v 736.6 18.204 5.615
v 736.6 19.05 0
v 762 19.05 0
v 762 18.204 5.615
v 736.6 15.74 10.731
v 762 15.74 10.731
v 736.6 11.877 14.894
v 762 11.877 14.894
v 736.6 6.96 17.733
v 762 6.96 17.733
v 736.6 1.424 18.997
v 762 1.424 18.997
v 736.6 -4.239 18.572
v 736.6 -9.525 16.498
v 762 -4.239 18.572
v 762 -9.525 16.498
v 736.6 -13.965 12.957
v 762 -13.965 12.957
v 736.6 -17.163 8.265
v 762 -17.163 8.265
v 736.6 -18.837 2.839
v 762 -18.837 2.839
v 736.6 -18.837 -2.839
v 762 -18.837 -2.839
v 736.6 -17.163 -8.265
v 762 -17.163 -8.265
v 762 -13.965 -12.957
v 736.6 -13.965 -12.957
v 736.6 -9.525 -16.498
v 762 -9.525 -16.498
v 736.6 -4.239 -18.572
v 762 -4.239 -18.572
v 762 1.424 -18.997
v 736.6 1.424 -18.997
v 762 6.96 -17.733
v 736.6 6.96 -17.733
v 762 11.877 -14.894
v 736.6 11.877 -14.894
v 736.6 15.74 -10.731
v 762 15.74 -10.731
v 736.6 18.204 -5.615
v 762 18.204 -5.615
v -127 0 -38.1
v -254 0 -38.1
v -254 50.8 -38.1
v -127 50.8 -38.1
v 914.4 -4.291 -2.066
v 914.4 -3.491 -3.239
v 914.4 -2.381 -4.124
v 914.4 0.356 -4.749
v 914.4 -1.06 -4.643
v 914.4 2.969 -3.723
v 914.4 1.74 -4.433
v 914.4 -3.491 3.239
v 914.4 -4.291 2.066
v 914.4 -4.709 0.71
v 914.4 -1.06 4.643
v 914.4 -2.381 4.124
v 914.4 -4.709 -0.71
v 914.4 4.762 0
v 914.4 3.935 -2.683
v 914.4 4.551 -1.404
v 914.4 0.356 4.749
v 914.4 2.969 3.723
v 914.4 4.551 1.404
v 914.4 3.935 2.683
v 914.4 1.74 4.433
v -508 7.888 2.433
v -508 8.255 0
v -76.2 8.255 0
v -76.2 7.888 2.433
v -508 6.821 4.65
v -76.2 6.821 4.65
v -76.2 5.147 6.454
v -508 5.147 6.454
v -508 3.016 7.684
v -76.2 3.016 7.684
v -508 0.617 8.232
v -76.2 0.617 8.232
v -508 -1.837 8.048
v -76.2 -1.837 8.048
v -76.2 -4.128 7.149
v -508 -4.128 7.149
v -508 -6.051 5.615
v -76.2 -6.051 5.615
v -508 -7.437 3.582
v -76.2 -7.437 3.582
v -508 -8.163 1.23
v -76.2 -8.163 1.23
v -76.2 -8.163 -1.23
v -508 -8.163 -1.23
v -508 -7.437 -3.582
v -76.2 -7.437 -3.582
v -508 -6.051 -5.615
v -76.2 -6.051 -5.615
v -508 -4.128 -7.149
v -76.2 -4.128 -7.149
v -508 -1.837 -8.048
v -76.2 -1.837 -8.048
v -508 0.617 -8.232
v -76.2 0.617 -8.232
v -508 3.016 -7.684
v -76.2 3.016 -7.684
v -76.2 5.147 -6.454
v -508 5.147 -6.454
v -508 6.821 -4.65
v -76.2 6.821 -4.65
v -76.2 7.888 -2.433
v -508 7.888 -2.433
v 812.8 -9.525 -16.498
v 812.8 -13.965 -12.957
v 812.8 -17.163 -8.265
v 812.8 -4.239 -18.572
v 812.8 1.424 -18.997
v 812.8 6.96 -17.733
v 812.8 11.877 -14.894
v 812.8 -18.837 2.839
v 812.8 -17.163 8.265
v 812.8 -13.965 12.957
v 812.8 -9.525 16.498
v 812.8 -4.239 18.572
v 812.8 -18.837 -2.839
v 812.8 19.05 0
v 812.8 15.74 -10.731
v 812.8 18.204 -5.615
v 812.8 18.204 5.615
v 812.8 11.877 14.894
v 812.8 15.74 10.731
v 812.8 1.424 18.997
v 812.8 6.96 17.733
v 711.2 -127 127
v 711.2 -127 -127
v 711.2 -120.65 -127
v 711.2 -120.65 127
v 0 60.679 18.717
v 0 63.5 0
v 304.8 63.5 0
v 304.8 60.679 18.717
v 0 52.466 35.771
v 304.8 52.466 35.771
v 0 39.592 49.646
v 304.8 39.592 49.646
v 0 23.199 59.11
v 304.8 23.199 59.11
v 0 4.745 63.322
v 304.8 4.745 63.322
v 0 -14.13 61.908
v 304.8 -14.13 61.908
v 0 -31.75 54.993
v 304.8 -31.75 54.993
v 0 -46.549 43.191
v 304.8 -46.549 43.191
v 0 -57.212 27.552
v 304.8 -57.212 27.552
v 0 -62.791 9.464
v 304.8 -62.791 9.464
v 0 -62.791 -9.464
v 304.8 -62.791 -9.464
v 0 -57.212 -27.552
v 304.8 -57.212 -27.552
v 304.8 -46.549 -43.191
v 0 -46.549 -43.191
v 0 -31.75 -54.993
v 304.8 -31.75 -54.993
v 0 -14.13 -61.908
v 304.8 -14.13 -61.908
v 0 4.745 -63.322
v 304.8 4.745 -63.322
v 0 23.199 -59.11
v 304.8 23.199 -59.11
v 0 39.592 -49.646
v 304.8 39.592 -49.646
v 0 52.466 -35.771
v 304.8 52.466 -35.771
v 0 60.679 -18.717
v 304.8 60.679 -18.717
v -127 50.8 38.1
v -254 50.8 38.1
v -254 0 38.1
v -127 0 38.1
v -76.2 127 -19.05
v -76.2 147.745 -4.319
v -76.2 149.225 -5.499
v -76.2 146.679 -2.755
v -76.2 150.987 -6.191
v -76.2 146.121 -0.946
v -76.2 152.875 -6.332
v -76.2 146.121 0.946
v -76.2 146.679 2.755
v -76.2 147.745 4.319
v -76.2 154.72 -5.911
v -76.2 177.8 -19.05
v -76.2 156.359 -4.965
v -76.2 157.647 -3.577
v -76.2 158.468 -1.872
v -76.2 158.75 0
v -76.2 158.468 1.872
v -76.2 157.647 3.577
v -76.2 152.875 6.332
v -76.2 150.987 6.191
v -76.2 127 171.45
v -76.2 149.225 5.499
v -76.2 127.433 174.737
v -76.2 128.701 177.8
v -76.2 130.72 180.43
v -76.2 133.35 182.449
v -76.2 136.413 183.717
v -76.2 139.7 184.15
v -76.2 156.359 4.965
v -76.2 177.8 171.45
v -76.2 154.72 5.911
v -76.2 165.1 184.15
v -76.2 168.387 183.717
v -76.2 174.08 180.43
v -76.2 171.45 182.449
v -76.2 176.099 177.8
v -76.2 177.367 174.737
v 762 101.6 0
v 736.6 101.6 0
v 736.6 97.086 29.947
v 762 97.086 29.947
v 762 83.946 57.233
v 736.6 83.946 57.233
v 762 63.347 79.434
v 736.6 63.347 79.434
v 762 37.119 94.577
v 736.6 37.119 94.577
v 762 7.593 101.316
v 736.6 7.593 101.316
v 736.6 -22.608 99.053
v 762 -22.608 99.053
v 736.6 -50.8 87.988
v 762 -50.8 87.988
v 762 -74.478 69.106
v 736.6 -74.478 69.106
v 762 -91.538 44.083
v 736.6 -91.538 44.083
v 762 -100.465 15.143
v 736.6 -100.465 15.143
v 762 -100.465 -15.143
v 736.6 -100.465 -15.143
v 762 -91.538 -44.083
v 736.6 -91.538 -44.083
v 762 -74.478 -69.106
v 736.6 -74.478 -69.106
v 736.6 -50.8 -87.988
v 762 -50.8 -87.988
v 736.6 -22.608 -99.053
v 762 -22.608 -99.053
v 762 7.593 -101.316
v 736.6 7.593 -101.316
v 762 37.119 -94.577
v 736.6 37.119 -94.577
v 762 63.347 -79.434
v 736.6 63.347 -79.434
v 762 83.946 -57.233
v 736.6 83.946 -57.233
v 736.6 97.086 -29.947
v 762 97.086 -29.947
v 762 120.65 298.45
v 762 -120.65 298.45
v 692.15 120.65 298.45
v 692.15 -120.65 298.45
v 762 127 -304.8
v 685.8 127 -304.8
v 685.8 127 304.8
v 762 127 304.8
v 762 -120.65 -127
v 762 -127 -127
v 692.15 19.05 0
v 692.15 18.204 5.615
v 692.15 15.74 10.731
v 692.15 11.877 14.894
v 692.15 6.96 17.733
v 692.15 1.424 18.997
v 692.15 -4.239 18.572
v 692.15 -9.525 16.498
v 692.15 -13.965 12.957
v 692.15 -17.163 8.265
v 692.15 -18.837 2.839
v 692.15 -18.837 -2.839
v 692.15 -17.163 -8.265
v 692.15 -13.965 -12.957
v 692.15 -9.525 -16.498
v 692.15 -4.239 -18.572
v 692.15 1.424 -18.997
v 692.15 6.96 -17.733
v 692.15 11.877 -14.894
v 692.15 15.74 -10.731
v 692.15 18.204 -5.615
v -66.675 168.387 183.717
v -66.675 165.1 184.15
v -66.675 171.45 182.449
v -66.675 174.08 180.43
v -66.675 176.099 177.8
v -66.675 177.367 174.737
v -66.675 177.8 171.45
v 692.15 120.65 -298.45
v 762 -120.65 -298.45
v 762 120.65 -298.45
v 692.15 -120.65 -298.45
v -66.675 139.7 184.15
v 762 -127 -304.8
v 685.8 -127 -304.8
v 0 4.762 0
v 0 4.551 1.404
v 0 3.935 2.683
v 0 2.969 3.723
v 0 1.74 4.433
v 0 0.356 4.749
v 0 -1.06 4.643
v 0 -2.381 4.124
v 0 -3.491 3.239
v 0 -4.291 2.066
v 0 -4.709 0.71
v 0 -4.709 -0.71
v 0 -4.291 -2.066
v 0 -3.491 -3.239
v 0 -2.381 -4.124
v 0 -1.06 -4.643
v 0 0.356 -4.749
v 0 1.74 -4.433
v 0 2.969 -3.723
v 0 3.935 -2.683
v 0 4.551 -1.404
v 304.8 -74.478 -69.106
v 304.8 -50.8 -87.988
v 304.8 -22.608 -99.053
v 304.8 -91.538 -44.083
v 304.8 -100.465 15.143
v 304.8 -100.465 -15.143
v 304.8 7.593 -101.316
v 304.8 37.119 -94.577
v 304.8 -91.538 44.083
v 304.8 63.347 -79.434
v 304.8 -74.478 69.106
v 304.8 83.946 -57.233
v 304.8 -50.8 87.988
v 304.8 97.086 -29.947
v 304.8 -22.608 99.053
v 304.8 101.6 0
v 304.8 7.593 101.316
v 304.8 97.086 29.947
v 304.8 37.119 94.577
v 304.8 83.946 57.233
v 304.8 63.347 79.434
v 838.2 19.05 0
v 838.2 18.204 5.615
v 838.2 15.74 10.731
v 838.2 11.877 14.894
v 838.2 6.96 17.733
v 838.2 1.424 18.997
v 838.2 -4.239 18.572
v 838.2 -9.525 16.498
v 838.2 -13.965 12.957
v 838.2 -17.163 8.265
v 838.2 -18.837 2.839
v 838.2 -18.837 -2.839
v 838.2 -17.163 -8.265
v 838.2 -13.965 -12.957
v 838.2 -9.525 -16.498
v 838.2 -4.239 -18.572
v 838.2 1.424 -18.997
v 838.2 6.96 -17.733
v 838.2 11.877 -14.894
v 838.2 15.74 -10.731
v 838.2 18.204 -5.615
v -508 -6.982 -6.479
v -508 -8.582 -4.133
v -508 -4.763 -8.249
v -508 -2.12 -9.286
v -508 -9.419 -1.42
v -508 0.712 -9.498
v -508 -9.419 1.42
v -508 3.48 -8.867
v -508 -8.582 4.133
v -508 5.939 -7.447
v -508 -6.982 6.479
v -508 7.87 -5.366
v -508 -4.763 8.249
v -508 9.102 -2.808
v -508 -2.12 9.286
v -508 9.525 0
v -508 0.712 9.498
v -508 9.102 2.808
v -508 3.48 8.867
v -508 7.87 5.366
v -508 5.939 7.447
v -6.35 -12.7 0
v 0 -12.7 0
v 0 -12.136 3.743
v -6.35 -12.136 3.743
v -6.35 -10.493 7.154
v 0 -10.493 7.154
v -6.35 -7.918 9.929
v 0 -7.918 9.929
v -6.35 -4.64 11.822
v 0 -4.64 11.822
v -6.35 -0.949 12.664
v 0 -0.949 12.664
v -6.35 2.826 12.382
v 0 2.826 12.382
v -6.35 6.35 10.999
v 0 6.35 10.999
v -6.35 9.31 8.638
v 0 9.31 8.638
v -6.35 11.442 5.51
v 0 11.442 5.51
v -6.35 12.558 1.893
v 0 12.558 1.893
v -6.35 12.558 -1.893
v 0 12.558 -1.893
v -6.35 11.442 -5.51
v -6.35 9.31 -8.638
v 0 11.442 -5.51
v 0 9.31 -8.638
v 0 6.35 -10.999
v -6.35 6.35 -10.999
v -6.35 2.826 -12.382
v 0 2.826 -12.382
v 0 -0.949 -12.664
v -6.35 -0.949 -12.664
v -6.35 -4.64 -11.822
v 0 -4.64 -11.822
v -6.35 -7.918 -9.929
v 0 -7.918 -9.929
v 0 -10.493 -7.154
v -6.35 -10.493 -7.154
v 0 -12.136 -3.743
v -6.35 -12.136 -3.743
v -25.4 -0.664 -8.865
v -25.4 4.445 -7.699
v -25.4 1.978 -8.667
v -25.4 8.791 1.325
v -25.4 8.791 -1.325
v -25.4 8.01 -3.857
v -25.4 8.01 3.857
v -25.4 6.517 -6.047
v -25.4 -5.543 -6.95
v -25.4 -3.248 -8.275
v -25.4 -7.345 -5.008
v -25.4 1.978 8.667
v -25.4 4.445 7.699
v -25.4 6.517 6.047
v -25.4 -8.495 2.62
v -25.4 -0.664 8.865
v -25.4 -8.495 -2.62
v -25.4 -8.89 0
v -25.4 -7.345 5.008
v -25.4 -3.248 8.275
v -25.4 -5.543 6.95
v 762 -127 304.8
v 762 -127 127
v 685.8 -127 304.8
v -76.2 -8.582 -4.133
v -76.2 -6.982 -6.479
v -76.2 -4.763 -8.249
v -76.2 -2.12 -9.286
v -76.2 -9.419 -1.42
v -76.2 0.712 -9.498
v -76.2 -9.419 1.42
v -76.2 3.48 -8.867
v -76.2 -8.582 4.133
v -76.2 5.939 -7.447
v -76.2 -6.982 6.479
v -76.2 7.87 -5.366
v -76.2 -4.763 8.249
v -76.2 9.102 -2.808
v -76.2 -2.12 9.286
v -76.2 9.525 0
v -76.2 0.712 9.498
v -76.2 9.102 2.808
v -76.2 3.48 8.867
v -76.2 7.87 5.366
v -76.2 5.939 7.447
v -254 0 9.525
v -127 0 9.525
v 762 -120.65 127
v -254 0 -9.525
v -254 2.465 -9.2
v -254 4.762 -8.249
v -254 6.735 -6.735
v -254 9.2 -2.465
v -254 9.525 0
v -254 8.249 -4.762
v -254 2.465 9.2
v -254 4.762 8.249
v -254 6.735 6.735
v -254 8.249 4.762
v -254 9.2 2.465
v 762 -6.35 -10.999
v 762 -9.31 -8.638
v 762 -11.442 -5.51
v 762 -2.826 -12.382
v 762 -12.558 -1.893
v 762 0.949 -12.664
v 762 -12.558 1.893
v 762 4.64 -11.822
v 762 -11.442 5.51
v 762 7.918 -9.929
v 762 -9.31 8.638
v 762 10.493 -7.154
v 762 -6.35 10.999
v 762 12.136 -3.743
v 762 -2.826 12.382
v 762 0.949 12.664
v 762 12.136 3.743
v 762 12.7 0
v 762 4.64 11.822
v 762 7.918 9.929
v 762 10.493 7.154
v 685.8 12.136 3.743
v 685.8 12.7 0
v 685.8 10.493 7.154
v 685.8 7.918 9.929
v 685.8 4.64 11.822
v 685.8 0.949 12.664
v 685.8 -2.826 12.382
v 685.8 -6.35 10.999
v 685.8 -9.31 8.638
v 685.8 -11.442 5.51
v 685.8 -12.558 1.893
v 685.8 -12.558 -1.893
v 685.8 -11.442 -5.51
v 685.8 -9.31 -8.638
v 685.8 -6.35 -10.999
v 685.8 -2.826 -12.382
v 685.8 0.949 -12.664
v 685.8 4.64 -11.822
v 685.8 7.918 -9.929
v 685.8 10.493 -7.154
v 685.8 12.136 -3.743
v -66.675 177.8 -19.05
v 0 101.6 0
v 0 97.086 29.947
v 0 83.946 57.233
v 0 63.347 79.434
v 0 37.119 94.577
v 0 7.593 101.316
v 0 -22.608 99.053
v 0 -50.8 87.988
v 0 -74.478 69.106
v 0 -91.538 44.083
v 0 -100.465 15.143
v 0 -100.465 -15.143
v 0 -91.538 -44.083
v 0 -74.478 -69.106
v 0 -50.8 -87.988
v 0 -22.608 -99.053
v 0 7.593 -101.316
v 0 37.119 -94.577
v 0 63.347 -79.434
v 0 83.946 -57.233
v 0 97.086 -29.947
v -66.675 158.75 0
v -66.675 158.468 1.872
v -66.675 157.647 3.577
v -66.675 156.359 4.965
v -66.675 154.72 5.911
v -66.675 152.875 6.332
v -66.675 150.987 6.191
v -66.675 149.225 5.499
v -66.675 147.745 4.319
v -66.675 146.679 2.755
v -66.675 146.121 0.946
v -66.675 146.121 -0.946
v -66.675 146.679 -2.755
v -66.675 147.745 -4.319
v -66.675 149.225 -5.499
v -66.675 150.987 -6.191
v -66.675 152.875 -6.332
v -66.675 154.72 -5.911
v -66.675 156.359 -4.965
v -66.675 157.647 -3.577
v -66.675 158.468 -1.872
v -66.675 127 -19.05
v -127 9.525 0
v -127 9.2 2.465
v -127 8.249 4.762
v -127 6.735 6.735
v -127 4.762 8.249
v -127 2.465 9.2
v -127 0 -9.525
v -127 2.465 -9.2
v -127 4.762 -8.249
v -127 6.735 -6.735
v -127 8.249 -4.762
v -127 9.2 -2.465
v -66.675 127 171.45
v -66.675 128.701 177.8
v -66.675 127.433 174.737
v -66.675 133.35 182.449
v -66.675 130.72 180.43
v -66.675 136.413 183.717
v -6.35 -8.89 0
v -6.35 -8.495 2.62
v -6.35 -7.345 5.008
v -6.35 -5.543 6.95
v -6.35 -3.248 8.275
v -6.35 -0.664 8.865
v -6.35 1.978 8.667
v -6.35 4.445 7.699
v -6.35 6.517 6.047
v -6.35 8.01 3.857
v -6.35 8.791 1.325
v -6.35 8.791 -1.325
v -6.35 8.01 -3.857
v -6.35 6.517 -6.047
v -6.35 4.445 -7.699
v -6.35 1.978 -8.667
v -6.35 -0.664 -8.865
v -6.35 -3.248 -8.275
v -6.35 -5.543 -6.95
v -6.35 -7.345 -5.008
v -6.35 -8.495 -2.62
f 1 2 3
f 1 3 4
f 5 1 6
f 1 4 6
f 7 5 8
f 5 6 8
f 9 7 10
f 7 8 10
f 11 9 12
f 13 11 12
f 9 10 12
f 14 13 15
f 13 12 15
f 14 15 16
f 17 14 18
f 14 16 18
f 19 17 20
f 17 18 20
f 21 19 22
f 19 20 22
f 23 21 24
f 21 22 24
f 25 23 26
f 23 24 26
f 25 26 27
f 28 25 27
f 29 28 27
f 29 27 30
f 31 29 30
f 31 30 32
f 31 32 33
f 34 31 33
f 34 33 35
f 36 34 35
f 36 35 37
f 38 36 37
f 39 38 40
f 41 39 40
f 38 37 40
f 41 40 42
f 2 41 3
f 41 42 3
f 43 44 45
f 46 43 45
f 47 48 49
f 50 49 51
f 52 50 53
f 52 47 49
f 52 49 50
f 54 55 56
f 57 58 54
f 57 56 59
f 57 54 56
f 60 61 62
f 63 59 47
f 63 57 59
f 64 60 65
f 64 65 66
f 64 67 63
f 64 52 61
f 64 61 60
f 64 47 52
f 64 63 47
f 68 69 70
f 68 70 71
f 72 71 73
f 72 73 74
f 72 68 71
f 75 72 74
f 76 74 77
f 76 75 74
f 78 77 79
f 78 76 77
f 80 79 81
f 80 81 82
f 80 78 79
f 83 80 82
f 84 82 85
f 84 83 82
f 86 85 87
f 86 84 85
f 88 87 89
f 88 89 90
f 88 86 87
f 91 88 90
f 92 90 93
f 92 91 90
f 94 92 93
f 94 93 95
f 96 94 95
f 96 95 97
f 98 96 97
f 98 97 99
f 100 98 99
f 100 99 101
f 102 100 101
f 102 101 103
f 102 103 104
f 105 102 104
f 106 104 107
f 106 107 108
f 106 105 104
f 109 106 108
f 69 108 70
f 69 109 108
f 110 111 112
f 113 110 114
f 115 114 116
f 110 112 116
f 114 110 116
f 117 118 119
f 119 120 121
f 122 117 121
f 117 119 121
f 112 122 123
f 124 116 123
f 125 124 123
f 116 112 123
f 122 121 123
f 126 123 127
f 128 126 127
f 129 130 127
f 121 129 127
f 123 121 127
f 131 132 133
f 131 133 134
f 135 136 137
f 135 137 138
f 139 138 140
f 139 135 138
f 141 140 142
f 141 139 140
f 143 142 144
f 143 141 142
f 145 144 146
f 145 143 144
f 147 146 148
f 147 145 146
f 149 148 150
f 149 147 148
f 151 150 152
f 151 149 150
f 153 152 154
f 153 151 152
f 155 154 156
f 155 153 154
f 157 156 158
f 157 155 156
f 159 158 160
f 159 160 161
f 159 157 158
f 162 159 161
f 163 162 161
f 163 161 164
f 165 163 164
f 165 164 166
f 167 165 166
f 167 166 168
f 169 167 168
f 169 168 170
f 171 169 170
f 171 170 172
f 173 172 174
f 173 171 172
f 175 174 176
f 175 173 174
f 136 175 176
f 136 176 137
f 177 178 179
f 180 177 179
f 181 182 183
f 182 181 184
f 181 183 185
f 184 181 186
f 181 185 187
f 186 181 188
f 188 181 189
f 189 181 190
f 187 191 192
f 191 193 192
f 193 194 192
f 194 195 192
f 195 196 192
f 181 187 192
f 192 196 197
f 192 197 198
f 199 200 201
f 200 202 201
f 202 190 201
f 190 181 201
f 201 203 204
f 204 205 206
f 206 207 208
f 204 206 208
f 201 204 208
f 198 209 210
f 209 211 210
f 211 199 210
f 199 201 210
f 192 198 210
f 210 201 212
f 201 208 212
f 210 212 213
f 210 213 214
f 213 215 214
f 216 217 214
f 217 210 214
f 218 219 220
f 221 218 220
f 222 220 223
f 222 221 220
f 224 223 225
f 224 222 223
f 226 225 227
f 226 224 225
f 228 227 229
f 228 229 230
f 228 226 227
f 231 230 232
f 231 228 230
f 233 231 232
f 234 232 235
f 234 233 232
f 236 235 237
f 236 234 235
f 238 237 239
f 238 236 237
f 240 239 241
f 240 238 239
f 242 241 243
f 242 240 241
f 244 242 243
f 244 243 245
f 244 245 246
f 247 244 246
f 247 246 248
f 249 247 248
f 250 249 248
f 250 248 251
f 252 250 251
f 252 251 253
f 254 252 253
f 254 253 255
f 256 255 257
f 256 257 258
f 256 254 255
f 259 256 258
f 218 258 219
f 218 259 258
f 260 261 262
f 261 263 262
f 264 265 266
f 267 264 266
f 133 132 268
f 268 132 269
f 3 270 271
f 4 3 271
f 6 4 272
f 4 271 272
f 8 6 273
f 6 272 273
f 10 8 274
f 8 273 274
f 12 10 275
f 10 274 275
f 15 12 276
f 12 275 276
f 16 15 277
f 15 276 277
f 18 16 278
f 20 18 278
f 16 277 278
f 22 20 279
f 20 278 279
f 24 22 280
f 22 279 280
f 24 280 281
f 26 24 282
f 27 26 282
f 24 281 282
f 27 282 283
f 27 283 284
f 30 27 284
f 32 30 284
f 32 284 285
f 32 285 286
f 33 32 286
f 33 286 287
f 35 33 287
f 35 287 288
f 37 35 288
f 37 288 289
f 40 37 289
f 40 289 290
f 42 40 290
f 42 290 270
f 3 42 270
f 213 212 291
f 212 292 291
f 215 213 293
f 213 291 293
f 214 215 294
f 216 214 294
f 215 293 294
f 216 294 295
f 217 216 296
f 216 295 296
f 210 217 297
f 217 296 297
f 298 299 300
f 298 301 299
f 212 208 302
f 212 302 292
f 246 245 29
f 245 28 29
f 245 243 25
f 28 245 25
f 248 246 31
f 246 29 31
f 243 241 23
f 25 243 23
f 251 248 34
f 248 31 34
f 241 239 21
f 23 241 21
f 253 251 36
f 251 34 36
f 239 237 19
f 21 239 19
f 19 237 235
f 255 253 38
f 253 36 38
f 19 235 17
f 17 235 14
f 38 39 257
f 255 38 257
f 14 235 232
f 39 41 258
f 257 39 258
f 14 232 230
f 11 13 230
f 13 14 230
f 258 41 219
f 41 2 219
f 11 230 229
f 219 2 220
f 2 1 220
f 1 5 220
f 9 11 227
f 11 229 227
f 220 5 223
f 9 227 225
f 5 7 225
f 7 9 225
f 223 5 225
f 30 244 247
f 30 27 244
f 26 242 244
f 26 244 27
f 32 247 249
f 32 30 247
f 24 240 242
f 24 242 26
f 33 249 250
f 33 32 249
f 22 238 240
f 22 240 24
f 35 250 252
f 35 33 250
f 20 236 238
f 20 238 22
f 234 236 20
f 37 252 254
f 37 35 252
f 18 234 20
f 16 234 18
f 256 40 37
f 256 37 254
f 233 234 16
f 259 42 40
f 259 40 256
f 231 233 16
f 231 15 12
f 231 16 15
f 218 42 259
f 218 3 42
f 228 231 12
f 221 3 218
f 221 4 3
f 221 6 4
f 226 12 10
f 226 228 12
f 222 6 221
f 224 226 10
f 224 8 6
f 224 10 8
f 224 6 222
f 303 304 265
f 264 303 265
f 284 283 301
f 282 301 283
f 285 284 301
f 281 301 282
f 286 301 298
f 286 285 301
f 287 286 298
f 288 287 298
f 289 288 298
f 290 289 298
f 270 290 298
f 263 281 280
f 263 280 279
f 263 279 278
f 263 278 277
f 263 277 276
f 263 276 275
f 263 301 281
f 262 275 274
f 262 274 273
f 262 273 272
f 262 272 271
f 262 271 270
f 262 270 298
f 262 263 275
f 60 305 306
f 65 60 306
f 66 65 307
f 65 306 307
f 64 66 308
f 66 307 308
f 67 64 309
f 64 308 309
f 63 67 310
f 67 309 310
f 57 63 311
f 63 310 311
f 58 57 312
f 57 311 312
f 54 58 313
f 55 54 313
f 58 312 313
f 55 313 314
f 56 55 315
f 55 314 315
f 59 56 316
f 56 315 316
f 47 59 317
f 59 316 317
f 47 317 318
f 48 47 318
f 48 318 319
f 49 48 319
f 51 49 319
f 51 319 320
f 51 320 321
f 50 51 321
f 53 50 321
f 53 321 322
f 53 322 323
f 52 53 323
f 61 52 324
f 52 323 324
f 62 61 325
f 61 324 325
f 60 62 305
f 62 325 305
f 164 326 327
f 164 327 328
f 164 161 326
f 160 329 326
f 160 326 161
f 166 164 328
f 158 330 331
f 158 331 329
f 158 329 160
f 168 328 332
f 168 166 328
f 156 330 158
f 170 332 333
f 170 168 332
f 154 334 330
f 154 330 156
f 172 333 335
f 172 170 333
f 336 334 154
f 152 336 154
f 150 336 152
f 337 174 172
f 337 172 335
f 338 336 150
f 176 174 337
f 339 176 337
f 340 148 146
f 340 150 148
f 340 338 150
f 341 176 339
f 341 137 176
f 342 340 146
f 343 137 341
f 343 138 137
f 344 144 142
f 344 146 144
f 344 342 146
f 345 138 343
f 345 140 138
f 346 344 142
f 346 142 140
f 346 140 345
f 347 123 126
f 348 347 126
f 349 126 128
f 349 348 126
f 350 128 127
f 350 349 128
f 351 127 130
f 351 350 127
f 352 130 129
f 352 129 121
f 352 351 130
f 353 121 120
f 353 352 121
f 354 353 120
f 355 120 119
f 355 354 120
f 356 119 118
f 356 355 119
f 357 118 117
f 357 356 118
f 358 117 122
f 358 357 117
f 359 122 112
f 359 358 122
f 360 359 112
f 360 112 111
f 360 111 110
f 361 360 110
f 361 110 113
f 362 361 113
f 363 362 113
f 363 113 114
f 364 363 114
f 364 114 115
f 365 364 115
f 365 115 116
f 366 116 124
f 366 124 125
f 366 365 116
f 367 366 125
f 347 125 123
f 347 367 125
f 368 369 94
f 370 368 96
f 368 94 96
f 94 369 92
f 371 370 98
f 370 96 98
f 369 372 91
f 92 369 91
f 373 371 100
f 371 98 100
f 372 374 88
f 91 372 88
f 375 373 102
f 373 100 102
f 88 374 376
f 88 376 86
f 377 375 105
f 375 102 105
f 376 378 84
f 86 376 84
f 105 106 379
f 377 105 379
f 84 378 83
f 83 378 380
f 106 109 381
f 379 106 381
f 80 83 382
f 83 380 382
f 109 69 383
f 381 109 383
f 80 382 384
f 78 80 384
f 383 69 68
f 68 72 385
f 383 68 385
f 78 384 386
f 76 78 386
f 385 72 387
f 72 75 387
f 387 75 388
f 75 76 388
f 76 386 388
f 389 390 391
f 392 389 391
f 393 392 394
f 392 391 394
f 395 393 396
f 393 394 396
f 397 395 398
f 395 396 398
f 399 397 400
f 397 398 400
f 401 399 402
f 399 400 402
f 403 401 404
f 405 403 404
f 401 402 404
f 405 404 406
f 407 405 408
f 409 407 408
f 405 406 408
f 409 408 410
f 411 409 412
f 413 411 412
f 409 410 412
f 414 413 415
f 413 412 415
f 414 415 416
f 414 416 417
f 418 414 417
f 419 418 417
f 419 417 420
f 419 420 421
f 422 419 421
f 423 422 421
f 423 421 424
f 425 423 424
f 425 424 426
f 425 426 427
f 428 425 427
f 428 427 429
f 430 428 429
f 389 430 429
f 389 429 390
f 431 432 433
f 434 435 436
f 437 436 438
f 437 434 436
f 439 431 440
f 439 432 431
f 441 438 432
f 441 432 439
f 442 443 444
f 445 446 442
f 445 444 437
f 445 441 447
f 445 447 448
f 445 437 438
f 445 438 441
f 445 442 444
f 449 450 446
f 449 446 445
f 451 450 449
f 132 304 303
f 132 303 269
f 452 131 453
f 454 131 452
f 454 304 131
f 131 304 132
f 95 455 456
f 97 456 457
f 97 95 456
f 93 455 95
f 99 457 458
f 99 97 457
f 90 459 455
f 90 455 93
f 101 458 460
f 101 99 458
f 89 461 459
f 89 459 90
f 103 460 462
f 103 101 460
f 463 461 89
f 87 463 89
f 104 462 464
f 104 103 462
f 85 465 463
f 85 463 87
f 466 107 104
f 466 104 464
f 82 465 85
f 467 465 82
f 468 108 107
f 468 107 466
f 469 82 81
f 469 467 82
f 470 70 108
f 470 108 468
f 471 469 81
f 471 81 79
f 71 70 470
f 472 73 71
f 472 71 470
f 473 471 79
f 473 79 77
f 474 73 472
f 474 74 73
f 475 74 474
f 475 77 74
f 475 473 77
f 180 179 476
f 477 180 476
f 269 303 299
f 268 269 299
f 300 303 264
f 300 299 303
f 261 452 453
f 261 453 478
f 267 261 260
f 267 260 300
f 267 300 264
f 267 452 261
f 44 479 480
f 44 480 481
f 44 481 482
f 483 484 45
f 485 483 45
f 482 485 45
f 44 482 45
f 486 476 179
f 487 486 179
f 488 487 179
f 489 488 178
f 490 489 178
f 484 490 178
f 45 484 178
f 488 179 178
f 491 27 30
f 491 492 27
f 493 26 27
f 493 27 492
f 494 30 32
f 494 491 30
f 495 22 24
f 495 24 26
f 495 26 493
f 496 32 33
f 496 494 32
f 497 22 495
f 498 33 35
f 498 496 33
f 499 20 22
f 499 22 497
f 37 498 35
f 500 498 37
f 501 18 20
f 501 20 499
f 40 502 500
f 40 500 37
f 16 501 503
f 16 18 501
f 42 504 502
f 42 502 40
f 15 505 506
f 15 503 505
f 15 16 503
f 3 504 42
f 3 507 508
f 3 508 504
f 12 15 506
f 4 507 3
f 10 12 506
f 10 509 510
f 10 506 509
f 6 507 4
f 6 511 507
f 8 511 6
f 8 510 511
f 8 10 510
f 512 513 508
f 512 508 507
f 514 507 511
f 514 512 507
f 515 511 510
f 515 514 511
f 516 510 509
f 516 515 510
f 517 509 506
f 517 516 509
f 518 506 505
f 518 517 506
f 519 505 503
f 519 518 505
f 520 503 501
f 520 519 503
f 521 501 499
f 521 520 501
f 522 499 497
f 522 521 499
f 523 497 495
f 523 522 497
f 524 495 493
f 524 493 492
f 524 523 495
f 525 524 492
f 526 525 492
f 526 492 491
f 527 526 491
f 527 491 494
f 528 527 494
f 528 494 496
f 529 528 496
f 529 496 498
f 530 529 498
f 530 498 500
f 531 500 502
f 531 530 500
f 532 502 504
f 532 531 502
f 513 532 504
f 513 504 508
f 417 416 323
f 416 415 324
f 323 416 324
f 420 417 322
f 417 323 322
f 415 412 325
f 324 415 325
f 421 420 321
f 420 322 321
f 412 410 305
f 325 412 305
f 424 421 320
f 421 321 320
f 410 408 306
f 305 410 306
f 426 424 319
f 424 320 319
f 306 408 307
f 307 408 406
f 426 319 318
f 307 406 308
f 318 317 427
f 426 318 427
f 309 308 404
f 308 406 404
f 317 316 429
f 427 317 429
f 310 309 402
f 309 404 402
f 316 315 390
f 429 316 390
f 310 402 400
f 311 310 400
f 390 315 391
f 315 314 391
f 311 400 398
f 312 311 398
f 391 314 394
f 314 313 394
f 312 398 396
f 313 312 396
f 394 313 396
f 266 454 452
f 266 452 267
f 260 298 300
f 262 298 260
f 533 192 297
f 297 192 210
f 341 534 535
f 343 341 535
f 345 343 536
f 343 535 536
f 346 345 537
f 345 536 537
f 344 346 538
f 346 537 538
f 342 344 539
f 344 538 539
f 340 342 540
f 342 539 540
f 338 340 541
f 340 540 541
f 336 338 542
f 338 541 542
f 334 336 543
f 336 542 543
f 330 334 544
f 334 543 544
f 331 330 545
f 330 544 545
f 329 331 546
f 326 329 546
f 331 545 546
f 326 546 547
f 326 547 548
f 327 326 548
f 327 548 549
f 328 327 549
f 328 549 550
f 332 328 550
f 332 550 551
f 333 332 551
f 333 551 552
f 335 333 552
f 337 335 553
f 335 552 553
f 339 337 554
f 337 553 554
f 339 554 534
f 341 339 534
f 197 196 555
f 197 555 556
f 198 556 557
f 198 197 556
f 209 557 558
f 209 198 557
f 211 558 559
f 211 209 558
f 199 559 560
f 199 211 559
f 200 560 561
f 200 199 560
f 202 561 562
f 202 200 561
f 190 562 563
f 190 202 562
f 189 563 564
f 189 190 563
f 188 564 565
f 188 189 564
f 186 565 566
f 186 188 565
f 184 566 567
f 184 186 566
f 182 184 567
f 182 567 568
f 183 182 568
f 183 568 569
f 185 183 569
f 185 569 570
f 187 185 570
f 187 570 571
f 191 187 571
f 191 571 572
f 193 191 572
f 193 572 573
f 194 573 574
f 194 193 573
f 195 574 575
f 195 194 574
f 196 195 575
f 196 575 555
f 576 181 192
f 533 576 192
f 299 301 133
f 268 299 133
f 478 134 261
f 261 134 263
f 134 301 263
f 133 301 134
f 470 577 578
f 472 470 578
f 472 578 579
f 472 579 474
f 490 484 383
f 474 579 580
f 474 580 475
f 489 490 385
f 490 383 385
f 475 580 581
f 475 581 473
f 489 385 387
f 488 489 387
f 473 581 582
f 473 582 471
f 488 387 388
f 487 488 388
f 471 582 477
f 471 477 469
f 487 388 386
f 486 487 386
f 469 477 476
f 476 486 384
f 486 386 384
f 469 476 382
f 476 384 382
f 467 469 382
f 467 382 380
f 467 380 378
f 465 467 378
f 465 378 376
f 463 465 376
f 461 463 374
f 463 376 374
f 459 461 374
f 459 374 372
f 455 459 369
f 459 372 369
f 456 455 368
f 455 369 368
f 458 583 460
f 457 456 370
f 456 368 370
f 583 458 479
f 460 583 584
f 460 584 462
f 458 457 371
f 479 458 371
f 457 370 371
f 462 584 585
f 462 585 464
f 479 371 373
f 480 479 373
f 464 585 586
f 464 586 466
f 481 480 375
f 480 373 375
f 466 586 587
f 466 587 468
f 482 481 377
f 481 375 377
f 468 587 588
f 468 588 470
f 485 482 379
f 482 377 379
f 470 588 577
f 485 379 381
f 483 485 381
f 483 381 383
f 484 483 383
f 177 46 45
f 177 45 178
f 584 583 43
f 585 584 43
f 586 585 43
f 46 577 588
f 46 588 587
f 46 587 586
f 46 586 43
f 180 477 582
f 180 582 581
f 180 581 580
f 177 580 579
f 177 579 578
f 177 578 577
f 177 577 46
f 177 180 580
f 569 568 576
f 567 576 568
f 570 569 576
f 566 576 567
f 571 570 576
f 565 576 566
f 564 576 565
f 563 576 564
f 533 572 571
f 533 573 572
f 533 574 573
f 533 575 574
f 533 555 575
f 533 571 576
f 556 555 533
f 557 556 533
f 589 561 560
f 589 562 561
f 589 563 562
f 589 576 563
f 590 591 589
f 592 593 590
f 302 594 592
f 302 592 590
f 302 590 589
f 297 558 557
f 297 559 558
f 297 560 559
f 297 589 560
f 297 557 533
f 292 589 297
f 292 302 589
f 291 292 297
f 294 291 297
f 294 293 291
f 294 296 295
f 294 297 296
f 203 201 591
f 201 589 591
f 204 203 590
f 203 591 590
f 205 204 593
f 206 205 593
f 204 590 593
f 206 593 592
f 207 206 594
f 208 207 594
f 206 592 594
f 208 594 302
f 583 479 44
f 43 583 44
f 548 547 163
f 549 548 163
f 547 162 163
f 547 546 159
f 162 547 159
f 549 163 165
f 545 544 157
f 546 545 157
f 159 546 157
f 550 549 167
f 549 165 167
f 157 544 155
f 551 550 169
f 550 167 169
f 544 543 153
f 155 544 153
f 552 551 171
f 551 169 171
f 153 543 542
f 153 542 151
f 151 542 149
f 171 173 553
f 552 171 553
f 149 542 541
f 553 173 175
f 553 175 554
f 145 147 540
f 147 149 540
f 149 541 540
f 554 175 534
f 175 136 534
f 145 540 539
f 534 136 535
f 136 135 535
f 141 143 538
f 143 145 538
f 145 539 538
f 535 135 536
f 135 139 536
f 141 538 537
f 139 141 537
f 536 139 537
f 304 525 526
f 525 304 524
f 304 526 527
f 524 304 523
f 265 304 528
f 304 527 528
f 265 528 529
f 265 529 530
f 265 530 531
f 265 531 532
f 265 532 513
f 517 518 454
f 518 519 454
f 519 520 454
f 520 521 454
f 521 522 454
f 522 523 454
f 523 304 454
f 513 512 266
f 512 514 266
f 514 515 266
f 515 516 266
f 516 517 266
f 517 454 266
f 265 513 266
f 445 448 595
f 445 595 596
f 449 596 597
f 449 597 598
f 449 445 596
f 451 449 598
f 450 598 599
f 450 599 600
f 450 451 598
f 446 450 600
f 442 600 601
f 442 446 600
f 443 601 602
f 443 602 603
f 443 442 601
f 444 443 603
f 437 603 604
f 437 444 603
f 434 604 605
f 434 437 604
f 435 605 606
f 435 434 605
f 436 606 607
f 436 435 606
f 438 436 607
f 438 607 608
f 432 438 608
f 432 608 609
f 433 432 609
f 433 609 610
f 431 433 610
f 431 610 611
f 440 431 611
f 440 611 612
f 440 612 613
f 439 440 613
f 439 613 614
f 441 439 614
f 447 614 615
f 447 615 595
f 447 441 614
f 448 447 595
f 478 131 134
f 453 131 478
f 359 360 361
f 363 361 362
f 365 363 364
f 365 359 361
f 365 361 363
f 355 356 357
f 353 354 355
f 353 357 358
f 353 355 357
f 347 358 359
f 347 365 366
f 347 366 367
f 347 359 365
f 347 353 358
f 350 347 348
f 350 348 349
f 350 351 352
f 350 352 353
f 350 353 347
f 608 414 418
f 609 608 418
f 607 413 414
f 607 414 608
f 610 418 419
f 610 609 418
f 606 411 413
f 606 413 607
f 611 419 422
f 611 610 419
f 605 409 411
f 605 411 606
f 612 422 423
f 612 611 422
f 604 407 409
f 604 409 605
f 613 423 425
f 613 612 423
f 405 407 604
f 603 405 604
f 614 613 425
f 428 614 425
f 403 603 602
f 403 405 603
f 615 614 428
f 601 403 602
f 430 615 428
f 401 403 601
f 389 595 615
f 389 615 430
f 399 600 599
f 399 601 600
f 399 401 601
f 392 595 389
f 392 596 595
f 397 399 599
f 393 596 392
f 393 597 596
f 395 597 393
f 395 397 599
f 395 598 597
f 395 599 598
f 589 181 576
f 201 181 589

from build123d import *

# Parameters (mm, degrees)
F0_R      = 4.7625
F1_DEPTH  = 914.4
F3_R      = 19.05
F4_DEPTH  = 25.4
F5_R      = 101.6
F5_R_2    = 63.5
F6_DEPTH  = 304.8
F8_W      = 254
F8_H      = 609.6
F8_R      = 12.7
F9_DEPTH  = 76.2
F12_DEPTH = 127
F14_W     = 50.8
F14_H     = 203.2
F14_R     = 6.35
F15_DEPTH = 9.525
F16_R     = 12.7
F17_T     = -6.35
F18_R     = 101.6
F18_R_2   = 19.05
F19_DEPTH = 25.4
F20_R     = 12.7
F21_DEPTH = 25.4
F22_R     = 12.7
F22_R_2   = 8.89
F23_DEPTH = 19.05
F25_R     = 9.525
F25_R_2   = 8.255
F26_DEPTH = 431.8
F27_W     = 50.8
F27_H     = 254
F28_DEPTH = 6.35


with BuildPart() as f1:
    # F0 (on Right) → F1 (new body)
    with BuildSketch(Plane.YZ):
        Circle(F0_R)
    extrude(amount=F1_DEPTH)

    # F20 (on face) → F21 (join)
    with BuildSketch(Plane(origin=(0, 0, 0), x_dir=(0, -1, 0), z_dir=(-1, 0, 0))):
        Circle(F20_R)
    extrude(amount=F21_DEPTH)

    # F22 (on face) → F23 (cut)
    with BuildSketch(Plane(origin=(-25.4, 0, 0), x_dir=(0, -1, 0), z_dir=(-1, 0, 0))):
        Circle(F22_R)
        Circle(F22_R_2, mode=Mode.SUBTRACT)
    extrude(amount=-F23_DEPTH, mode=Mode.SUBTRACT)


with BuildPart() as f4:
    # F3 (on offset) → F4 (new body)
    with BuildSketch(Plane.YZ.offset(838.2)):
        Circle(F3_R)
    extrude(amount=-F4_DEPTH)


with BuildPart() as f6:
    # F5 (on Right) → F6 (new body)
    with BuildSketch(Plane.YZ):
        Circle(F5_R)
        Circle(F5_R_2, mode=Mode.SUBTRACT)
    extrude(amount=F6_DEPTH)


with BuildPart() as f9:
    # F8 (on offset) → F9 (new body)
    with BuildSketch(Plane.YZ.offset(685.8)):
        Rectangle(F8_W, F8_H)
        Circle(F8_R, mode=Mode.SUBTRACT)
    extrude(amount=F9_DEPTH)

    # F17
    f17_openings = [f9.faces().sort_by_distance(p)[0] for p in [
        (762, 0, -298.196),
    ]]
    offset(amount=F17_T, openings=f17_openings)

    # F27 (on face) → F28 (cut)
    with BuildSketch(Plane.XZ.offset(127)):
        with Locations((736.6, 0)):
            Rectangle(F27_W, F27_H)
    extrude(amount=-F28_DEPTH, mode=Mode.SUBTRACT)


with BuildPart() as f12:
    # F11 (on offset) → F12 (new body)
    with BuildSketch(Plane.YZ.offset(-254)):
        with BuildLine():
            ThreePointArc((0, 9.525), (6.7351920908, 6.7351920908), (9.525, 0))
            ThreePointArc((9.525, 0), (6.7351920908, -6.7351920908), (0, -9.525))
            Line((0, -9.525), (0, -38.1))
            Line((0, -38.1), (50.8, -38.1))
            Line((50.8, -38.1), (50.8, 38.1))
            Line((50.8, 38.1), (0, 38.1))
            Line((0, 38.1), (0, 9.525))
        make_face()
    extrude(amount=F12_DEPTH)

    # F25 (on offset) → F26 (join, through all)
    with BuildSketch(Plane.YZ.offset(-508)):
        Circle(F25_R)
        Circle(F25_R_2, mode=Mode.SUBTRACT)
    extrude(amount=F26_DEPTH)


with BuildPart() as f15:
    # F14 (on offset) → F15 (new body)
    with BuildSketch(Plane.YZ.offset(-76.2)):
        with Locations((152.4, 82.55)):
            Rectangle(F14_W, F14_H)
        with Locations((152.4, 0)):
            Circle(F14_R, mode=Mode.SUBTRACT)
    extrude(amount=F15_DEPTH)

    # F16
    f16_edges = [f15.edges().sort_by_distance(p)[0] for p in [
        (-71.4375, 177.8, 184.15),
        (-71.4375, 127, 184.15),
    ]]
    fillet(f16_edges, radius=F16_R)


with BuildPart() as f19:
    # F18 (on face) → F19 (new body)
    with BuildSketch(Plane.YZ.offset(762)):
        Circle(F18_R)
        Circle(F18_R_2, mode=Mode.SUBTRACT)
    extrude(amount=-F19_DEPTH)


solid = Compound([f1.part, f4.part, f6.part, f9.part, f12.part, f15.part, f19.part])
